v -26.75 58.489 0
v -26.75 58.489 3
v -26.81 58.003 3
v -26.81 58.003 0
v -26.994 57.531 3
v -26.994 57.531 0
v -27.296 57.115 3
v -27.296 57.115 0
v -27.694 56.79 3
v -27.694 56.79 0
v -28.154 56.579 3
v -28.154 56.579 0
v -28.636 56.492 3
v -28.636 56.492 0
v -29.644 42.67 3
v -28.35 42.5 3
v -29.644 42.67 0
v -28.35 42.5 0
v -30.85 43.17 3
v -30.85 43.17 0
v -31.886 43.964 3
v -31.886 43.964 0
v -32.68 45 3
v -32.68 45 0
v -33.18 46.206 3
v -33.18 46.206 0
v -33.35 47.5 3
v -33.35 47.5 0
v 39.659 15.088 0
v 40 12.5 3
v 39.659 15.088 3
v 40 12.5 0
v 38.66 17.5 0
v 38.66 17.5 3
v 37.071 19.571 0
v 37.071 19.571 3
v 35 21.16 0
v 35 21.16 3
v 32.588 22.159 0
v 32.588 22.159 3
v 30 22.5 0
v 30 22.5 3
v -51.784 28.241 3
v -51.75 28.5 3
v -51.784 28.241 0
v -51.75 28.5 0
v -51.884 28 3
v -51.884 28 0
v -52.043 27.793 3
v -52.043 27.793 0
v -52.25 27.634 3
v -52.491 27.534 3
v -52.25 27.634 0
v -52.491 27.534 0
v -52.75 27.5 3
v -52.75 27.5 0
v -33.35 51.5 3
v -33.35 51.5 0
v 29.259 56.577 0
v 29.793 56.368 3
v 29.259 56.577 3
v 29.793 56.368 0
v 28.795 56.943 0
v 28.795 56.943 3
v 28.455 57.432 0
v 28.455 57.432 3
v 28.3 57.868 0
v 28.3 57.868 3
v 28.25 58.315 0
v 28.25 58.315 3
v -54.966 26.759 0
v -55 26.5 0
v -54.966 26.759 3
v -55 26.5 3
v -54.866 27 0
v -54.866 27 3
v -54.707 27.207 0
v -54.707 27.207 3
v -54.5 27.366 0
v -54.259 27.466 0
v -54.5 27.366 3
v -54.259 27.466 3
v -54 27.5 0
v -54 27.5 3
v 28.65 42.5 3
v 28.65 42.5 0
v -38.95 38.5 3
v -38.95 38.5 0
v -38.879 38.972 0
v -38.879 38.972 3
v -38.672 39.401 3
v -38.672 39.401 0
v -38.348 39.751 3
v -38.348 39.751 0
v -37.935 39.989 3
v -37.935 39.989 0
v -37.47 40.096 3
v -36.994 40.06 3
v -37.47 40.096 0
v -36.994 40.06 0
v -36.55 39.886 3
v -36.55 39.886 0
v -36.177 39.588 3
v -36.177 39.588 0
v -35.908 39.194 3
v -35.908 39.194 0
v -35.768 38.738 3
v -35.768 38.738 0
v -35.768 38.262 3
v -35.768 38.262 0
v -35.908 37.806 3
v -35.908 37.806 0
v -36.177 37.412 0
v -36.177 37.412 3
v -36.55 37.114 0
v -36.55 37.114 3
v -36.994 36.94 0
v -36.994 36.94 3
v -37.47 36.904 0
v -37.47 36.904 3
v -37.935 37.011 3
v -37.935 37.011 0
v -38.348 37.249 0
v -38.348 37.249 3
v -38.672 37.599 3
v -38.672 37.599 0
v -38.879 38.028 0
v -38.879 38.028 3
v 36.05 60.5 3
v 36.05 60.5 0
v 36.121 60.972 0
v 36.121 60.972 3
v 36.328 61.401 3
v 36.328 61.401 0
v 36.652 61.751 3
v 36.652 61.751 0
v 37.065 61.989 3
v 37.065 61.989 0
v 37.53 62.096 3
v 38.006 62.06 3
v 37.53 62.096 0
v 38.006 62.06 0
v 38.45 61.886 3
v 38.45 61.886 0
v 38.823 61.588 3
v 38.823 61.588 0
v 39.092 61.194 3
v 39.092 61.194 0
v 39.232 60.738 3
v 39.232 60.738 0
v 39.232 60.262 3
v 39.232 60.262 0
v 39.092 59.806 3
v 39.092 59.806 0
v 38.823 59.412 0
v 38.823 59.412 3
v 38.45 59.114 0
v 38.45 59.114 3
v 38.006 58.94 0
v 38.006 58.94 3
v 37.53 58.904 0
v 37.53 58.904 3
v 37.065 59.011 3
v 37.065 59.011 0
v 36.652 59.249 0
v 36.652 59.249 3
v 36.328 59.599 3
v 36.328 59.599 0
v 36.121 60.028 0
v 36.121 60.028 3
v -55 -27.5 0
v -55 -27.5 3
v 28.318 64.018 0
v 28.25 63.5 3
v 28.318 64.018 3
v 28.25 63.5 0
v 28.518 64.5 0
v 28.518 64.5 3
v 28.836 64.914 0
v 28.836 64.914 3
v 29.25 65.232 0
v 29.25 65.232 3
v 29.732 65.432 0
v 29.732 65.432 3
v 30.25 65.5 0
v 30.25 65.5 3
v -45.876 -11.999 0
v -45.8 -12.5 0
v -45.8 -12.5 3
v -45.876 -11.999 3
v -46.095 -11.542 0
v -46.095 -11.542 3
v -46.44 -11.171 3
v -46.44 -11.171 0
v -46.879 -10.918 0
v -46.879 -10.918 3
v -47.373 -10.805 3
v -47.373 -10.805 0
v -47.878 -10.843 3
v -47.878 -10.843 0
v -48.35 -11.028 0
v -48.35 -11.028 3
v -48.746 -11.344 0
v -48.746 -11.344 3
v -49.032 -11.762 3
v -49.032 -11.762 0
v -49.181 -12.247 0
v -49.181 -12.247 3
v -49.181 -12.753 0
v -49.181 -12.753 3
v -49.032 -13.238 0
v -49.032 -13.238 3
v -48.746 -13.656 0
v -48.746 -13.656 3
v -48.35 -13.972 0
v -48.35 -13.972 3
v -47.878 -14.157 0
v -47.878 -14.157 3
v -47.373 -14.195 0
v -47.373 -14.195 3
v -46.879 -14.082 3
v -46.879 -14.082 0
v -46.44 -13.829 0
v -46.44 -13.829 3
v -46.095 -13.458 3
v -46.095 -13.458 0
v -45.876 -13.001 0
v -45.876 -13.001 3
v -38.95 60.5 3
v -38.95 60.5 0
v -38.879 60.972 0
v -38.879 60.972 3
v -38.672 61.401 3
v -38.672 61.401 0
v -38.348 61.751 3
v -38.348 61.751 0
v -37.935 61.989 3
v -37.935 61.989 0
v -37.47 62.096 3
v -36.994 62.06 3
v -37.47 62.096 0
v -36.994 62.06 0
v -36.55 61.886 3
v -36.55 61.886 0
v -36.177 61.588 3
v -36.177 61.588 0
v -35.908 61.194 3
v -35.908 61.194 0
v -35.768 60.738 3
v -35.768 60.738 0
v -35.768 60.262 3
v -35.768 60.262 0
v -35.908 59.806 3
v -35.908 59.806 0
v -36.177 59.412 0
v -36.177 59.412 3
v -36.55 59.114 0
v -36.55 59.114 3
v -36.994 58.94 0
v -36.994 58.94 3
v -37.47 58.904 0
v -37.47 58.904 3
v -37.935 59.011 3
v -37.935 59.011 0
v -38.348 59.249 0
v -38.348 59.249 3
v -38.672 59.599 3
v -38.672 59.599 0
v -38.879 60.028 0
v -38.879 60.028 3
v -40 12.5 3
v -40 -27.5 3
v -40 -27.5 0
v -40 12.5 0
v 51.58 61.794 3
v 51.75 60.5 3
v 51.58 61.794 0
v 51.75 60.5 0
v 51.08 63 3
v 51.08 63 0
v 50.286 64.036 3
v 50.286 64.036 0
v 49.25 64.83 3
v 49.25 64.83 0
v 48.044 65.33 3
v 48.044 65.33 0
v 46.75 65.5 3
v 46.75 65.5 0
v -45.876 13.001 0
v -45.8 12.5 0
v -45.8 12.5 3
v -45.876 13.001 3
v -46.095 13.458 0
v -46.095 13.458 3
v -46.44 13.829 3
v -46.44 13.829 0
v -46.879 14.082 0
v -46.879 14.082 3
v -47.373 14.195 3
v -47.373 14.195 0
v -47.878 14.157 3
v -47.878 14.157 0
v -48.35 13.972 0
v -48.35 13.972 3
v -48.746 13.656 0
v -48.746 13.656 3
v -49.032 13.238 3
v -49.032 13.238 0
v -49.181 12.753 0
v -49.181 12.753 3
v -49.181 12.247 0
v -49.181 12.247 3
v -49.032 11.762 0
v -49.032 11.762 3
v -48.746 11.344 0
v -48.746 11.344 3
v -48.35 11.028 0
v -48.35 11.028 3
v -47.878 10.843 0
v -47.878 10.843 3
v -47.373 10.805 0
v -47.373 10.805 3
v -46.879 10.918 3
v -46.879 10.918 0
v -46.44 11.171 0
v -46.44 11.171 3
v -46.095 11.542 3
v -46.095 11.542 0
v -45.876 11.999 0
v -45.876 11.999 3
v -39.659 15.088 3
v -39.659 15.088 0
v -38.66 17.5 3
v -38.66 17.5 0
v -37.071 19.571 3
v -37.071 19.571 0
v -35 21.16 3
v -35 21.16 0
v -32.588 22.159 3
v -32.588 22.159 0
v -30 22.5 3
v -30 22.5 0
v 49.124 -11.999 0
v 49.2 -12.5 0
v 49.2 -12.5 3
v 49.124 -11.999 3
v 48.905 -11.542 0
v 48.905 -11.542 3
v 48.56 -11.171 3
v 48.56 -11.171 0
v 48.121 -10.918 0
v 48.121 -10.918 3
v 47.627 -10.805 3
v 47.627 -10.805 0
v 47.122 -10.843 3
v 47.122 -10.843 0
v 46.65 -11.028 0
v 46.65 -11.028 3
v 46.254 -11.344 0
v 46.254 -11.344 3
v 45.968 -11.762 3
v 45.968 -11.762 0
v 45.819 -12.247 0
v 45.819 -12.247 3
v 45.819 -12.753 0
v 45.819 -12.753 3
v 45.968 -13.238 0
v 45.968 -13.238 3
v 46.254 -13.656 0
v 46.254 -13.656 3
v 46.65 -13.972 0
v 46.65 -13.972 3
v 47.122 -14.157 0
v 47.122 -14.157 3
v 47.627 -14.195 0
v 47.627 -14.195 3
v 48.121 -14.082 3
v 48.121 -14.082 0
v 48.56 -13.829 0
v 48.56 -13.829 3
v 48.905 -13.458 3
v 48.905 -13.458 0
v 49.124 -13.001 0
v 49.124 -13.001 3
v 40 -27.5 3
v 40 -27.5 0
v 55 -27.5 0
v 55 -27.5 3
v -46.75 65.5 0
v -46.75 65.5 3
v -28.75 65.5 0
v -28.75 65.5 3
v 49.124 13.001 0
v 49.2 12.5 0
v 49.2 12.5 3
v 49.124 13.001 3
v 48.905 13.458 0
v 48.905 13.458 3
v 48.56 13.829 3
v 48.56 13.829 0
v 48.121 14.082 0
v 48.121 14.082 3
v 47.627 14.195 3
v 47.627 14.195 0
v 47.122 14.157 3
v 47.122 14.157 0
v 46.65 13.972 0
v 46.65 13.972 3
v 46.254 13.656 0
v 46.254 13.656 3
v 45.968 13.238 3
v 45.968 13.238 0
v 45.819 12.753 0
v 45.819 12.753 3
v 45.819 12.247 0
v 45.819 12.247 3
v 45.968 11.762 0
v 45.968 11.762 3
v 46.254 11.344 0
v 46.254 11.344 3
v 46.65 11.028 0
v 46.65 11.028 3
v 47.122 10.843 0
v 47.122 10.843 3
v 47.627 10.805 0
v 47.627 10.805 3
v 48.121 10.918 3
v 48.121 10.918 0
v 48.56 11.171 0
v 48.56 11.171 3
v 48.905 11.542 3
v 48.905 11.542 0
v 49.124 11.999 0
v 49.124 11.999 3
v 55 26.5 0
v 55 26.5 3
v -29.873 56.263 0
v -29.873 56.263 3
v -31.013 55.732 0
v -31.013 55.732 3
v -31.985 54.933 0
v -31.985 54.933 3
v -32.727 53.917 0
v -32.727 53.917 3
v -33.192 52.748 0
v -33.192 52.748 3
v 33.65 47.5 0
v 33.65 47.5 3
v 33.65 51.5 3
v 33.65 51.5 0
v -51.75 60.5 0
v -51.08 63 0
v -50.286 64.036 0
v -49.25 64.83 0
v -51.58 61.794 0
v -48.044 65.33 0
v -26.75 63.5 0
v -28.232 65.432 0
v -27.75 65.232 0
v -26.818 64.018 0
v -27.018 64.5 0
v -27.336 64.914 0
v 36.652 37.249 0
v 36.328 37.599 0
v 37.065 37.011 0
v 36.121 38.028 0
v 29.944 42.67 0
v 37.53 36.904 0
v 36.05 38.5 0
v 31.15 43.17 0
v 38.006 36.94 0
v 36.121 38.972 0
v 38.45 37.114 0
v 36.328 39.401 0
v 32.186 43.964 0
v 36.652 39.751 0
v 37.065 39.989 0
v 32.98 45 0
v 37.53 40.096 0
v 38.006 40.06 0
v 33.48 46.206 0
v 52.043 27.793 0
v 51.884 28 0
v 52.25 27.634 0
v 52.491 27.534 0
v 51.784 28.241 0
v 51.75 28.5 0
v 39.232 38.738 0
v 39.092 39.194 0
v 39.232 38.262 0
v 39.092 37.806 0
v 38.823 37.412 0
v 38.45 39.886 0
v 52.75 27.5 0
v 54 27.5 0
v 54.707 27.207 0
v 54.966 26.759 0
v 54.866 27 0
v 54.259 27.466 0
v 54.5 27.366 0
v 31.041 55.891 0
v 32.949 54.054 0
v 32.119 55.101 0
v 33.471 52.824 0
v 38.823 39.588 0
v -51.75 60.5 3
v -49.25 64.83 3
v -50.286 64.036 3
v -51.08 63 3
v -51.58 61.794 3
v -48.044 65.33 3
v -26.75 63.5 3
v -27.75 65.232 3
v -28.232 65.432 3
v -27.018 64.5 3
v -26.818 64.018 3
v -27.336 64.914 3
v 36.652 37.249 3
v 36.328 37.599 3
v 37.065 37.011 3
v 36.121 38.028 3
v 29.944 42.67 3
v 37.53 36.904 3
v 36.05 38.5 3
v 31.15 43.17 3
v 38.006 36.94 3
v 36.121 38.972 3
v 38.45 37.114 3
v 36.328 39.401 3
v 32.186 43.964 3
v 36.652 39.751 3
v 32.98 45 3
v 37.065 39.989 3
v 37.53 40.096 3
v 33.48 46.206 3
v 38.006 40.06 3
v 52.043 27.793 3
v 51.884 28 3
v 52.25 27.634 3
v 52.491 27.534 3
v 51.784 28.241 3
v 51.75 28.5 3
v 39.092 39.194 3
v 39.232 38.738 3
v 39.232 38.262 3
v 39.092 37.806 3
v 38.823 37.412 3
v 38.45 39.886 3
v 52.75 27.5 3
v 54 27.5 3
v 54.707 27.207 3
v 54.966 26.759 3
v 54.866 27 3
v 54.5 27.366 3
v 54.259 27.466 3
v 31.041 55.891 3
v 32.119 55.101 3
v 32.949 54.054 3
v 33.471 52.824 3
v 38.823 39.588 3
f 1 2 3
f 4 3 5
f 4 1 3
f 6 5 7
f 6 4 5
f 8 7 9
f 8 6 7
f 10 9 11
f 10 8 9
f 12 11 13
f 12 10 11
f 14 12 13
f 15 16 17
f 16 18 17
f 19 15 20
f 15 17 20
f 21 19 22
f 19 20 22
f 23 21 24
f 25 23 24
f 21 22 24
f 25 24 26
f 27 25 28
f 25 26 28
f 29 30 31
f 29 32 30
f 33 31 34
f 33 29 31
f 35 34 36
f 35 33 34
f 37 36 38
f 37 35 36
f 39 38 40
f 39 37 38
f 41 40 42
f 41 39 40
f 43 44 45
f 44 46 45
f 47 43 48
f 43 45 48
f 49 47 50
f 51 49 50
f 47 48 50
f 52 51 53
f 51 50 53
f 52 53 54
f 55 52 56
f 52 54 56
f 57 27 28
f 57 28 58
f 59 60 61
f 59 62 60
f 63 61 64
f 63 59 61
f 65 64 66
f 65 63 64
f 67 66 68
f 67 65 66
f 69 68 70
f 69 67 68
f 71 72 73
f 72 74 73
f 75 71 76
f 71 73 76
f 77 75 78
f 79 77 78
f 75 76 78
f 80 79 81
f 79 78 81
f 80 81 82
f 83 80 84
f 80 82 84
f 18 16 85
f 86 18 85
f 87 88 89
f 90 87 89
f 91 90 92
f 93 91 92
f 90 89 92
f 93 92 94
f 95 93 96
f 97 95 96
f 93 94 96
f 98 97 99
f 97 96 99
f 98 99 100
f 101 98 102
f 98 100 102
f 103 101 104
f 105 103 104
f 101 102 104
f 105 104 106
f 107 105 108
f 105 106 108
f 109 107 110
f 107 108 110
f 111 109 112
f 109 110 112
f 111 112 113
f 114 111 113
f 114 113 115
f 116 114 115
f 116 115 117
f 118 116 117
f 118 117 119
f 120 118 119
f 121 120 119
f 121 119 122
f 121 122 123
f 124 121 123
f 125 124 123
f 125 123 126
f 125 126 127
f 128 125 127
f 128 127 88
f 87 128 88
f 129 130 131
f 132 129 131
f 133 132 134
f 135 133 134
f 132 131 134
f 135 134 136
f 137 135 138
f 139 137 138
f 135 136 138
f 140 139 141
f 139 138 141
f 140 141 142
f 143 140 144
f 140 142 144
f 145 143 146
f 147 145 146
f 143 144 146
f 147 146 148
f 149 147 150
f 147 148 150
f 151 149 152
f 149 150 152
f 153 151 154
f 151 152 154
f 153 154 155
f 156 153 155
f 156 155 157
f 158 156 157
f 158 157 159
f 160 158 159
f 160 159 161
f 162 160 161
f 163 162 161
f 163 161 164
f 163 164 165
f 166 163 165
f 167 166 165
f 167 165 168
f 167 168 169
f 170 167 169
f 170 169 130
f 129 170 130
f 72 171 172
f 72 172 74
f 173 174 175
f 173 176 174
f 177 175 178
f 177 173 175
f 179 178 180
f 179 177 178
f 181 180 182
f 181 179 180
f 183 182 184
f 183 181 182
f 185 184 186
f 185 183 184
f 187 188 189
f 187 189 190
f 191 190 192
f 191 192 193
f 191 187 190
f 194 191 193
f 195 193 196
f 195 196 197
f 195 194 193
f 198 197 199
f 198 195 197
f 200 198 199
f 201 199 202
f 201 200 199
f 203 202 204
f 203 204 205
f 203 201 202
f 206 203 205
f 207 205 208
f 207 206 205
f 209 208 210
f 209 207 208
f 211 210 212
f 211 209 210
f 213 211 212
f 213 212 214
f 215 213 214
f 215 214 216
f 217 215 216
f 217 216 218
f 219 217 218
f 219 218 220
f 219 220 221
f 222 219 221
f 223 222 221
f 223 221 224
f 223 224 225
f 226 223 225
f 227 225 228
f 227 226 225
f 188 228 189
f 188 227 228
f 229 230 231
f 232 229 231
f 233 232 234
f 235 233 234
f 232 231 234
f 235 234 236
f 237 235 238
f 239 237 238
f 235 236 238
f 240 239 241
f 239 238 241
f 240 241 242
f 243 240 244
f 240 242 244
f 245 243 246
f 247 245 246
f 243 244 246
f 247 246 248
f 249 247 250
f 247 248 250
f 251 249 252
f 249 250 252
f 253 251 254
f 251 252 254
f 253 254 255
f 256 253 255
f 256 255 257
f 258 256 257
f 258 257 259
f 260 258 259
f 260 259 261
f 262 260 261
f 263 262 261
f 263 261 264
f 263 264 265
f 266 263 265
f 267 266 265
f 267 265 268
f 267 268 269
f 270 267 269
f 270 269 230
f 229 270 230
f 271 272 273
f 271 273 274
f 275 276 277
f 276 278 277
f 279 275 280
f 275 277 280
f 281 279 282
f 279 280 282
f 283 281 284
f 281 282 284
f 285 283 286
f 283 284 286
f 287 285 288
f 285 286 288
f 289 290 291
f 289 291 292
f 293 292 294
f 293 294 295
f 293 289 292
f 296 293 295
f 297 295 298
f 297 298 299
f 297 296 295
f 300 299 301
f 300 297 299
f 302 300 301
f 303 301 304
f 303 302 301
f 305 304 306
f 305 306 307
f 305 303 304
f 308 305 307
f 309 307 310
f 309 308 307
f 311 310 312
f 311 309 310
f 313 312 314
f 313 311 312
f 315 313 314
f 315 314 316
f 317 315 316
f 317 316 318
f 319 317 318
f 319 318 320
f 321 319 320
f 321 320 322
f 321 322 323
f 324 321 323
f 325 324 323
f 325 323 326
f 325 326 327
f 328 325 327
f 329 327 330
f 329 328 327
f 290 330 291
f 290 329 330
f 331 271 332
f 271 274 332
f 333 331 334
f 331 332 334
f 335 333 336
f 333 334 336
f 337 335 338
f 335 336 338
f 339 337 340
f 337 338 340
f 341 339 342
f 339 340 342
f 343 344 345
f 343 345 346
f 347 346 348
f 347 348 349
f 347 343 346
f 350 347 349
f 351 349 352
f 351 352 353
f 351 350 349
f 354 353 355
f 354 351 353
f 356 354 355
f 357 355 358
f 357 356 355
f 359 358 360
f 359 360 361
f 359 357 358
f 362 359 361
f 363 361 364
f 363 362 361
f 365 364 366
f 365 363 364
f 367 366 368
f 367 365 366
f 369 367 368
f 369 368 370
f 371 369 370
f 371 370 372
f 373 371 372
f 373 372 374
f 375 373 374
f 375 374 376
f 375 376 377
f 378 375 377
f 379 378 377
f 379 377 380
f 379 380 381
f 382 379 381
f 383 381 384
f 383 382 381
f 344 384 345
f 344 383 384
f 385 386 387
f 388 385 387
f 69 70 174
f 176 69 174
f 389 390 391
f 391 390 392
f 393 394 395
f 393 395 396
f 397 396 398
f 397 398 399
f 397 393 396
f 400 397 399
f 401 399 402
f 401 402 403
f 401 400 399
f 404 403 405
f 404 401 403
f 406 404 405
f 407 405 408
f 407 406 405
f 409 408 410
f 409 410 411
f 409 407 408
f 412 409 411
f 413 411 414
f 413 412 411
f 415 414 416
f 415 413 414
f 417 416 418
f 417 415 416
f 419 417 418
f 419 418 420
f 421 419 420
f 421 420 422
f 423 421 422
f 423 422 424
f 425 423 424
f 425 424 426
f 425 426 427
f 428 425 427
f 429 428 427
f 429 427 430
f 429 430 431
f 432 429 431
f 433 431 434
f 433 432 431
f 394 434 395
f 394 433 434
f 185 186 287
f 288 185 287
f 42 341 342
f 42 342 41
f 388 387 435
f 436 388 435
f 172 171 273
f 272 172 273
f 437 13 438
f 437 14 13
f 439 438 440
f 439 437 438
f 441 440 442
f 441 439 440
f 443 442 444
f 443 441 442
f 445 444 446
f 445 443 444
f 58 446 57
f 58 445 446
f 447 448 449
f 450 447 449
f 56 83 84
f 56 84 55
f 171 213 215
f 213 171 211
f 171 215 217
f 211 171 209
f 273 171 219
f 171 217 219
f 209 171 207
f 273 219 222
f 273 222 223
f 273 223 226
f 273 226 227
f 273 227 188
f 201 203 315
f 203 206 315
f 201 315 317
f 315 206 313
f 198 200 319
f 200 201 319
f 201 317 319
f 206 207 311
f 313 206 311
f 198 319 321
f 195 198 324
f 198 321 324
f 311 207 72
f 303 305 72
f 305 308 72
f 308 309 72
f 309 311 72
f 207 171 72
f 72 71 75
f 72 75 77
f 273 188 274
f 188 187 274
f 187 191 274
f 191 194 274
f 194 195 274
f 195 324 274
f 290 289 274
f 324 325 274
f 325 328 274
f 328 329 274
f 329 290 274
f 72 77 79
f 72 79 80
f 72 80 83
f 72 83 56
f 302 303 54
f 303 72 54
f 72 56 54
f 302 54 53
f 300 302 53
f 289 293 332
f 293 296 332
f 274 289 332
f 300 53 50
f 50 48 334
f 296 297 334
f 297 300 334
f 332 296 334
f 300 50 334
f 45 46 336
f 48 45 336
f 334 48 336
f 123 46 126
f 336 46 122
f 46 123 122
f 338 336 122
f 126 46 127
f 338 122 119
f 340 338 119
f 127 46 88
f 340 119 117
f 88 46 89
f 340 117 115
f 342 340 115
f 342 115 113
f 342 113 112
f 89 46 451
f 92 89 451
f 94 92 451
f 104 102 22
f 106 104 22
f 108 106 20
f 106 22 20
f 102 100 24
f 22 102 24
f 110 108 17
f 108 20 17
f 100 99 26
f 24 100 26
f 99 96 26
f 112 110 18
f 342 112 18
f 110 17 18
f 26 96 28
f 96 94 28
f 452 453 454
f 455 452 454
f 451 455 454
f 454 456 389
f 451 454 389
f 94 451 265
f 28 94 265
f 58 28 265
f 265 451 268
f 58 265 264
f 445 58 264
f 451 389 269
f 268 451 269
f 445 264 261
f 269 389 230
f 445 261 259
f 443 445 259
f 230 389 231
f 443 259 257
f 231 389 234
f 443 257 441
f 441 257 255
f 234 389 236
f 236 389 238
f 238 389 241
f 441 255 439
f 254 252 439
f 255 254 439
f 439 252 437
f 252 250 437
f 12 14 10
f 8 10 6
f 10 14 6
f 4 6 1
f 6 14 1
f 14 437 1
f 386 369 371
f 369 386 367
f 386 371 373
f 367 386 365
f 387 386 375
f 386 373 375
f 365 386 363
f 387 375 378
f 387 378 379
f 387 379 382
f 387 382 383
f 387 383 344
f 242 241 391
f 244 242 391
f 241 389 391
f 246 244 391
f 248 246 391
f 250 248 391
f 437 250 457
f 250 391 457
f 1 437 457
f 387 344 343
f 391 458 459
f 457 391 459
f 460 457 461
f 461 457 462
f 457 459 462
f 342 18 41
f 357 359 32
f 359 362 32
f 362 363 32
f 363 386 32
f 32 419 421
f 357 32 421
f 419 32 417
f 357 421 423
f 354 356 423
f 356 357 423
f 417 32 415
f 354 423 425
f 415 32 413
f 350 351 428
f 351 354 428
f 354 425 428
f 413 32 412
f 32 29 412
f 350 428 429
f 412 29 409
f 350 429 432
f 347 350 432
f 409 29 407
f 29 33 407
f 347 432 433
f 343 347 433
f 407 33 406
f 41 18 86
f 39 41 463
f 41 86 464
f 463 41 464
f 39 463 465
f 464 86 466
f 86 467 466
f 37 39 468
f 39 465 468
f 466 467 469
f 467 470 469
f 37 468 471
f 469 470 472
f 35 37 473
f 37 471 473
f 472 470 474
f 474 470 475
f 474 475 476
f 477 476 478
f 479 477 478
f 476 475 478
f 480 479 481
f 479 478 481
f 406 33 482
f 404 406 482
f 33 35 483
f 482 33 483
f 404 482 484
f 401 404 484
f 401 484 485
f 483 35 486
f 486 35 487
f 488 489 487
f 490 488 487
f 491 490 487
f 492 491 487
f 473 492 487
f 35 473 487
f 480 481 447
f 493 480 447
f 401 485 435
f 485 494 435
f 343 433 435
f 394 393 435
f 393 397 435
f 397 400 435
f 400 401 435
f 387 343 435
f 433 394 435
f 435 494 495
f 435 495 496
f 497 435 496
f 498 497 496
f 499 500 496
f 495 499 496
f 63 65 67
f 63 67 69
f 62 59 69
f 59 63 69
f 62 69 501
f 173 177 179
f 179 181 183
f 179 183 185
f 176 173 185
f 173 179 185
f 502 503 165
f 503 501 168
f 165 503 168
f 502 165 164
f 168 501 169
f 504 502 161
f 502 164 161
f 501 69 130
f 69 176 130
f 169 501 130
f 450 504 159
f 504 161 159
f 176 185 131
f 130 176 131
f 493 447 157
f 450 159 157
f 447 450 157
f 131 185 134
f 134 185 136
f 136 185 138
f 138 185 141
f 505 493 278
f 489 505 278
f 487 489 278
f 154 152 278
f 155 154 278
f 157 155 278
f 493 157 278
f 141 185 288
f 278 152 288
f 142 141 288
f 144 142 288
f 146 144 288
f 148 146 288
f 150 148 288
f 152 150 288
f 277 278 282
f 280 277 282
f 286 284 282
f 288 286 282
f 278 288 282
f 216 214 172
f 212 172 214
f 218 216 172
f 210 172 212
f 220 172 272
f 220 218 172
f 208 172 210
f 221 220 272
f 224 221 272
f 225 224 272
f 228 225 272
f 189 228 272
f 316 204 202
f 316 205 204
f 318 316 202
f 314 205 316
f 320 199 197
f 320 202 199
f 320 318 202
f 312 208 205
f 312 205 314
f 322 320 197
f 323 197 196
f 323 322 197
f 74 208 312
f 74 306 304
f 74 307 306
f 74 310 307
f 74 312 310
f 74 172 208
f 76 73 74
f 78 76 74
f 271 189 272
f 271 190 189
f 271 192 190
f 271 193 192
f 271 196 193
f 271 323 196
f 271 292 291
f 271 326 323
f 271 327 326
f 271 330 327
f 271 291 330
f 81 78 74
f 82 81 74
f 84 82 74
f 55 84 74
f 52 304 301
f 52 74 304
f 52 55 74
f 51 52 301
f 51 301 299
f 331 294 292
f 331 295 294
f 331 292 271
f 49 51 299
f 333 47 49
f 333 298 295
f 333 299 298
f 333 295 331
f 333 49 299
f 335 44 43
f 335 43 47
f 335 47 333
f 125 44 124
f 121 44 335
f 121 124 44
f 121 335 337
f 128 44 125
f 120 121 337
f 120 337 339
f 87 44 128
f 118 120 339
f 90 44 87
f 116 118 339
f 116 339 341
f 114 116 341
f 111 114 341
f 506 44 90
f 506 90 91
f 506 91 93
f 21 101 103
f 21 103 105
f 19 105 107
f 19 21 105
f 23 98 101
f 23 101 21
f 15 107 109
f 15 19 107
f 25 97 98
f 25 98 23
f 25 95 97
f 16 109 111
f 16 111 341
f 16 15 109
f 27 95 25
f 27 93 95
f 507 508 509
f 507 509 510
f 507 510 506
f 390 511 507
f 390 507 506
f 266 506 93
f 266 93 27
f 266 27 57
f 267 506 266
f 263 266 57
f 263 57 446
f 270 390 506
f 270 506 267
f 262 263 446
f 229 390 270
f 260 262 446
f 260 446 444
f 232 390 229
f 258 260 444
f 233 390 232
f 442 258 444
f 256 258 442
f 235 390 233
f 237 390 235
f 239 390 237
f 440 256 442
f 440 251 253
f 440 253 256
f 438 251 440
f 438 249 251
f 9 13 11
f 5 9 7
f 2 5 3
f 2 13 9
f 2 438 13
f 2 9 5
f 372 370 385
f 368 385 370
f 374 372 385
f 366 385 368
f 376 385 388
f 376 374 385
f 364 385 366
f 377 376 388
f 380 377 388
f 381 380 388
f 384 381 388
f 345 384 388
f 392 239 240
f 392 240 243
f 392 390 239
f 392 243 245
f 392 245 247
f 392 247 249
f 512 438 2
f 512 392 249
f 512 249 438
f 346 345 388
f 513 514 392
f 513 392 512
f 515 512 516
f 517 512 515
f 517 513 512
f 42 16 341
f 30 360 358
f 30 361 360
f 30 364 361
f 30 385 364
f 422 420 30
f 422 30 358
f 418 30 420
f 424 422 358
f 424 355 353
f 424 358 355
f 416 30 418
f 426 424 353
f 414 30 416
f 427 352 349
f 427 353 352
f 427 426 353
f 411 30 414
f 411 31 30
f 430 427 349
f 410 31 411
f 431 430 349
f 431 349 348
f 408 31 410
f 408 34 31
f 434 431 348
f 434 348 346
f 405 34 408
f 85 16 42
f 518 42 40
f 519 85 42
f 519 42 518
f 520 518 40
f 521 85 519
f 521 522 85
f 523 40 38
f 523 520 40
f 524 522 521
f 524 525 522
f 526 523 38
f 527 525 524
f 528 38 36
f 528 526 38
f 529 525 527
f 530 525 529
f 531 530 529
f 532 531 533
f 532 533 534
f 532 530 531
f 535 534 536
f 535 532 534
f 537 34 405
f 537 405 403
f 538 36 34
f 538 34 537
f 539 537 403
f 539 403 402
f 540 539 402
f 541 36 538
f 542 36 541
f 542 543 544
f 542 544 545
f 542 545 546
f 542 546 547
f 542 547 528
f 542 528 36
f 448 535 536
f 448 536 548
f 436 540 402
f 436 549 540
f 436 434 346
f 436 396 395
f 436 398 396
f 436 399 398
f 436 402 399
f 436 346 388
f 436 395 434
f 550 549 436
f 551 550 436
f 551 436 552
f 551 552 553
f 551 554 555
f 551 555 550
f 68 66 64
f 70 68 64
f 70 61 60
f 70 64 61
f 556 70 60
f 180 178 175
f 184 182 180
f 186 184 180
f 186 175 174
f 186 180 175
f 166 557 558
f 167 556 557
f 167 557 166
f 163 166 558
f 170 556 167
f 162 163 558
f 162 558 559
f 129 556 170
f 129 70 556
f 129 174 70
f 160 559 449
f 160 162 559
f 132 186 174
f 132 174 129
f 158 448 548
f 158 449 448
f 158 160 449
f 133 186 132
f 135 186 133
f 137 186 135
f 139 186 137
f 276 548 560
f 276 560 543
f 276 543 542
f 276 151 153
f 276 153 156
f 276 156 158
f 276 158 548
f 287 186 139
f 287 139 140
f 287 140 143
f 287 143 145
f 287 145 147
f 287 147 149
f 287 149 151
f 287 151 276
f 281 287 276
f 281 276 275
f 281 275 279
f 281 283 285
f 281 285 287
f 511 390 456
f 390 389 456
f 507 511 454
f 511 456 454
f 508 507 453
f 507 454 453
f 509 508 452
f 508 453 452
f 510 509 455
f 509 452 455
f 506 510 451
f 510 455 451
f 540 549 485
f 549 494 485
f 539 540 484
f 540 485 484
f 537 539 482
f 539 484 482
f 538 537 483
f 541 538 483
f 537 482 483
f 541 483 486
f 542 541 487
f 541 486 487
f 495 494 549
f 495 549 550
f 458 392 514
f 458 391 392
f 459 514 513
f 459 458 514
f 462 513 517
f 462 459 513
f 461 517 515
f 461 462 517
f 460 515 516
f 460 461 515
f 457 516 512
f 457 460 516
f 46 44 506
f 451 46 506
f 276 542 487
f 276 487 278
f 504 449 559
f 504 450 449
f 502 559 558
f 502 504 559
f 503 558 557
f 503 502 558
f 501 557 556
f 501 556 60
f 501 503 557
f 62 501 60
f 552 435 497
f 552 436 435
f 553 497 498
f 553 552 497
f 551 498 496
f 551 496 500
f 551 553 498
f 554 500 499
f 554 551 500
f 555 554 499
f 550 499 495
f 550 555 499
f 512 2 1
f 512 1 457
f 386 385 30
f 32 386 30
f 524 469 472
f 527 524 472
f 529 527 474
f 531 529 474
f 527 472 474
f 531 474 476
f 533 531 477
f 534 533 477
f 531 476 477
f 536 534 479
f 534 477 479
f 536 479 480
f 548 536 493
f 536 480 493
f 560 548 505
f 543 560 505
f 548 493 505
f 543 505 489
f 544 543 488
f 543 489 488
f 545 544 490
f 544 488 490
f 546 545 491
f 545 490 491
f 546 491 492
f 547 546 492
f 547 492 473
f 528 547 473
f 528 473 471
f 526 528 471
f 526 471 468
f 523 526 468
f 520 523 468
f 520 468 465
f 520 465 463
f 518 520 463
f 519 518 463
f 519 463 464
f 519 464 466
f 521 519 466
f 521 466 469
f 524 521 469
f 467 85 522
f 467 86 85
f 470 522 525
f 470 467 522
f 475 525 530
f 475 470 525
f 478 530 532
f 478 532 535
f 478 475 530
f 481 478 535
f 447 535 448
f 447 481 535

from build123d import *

# Parameters (mm, degrees)
SKETCH_1_W          = 110
SKETCH_1_H          = 55
SKETCH_1_R          = 1.7
EXTRUDE_1_DEPTH     = 3
SKETCH_2_W          = 103.5
SKETCH_2_H          = 38
EXTRUDE_2_DEPTH     = 3
SKETCH_3_R          = 1.6
CUT_EXTRUDE_1_DEPTH = 4
SKETCH_4_W          = 80
SKETCH_4_H          = 50
SKETCH_4_W_2        = 66.999999997
SKETCH_4_H_2        = 13.999999819
CUT_EXTRUDE_2_DEPTH = 4
FILLET_2_R          = 10
FILLET_3_R          = 1
FILLET_5_R          = 5
SKETCH_10_R         = 1.65
CUT_EXTRUDE_5_DEPTH = 4
SKETCH_11_W         = 55
SKETCH_11_H         = 9
CUT_EXTRUDE_6_DEPTH = 4
FILLET_6_R          = 2


with BuildPart() as part:
    # 草图1 → 凸台-拉伸1 (new body)
    with BuildSketch(Plane.XY):
        Rectangle(SKETCH_1_W, SKETCH_1_H)
        with Locations((-47.5, 12.5)):
            Circle(SKETCH_1_R, mode=Mode.SUBTRACT)
        with Locations((-47.5, -12.5)):
            Circle(SKETCH_1_R, mode=Mode.SUBTRACT)
        with Locations((47.5, 12.5)):
            Circle(SKETCH_1_R, mode=Mode.SUBTRACT)
        with Locations((47.5, -12.5)):
            Circle(SKETCH_1_R, mode=Mode.SUBTRACT)
    extrude(amount=EXTRUDE_1_DEPTH)

    # 草图2 → 凸台-拉伸2 (add)
    with BuildSketch(Plane.XY.offset(3)):
        with Locations((0, 46.5)):
            Rectangle(SKETCH_2_W, SKETCH_2_H)
    extrude(amount=-EXTRUDE_2_DEPTH)

    # 草图3 → 切除-拉伸1 (cut, through all)
    with BuildSketch(Plane(origin=(0, 0, 0), x_dir=(-1, 0, 0), z_dir=(0, 0, -1))):
        with Locations((37.35, 60.5)):
            Circle(SKETCH_3_R)
        with Locations((-37.649999997, 60.5)):
            Circle(SKETCH_3_R)
        with Locations((-37.649999997, 38.500000181)):
            Circle(SKETCH_3_R)
        with Locations((37.35, 38.500000181)):
            Circle(SKETCH_3_R)
    extrude(amount=-CUT_EXTRUDE_1_DEPTH, mode=Mode.SUBTRACT)

    # 草图4 → 切除-拉伸2 (cut, through all)
    with BuildSketch(Plane.XY.offset(3)):
        with Locations((0, -2.5)):
            Rectangle(SKETCH_4_W, SKETCH_4_H)
        with Locations((0.149999999, 49.500000091)):
            Rectangle(SKETCH_4_W_2, SKETCH_4_H_2)
    extrude(amount=-CUT_EXTRUDE_2_DEPTH, mode=Mode.SUBTRACT)

    # 圆角2
    fillet_2_edges = [part.edges().sort_by_distance(p)[0] for p in [
        (-40, 22.5, 1.5),
        (40, 22.5, 1.5),
    ]]
    fillet(fillet_2_edges, radius=FILLET_2_R)

    # 圆角3
    fillet_3_edges = [part.edges().sort_by_distance(p)[0] for p in [
        (51.75, 27.5, 1.5),
        (-51.75, 27.5, 1.5),
        (-55, 27.5, 1.5),
        (55, 27.5, 1.5),
    ]]
    fillet(fillet_3_edges, radius=FILLET_3_R)

    # 圆角5
    fillet_5_edges = [part.edges().sort_by_distance(p)[0] for p in [
        (-51.75, 65.5, 1.5),
        (51.75, 65.5, 1.5),
        (-33.35, 56.5, 1.5),
        (33.649999997, 56.5, 1.5),
        (33.649999997, 42.500000181, 1.5),
        (-33.35, 42.500000181, 1.5),
    ]]
    fillet(fillet_5_edges, radius=FILLET_5_R)

    # 草图10 → 切除-拉伸5 (cut, through all)
    with BuildSketch(Plane.XY.offset(3)):
        with Locations((-22.85, 60.5)):
            Circle(SKETCH_10_R)
        with Locations((5.15, 60.5)):
            Circle(SKETCH_10_R)
    extrude(amount=-CUT_EXTRUDE_5_DEPTH, mode=Mode.SUBTRACT)

    # 草图11 → 切除-拉伸6 (cut, through all)
    with BuildSketch(Plane.XY.offset(3)):
        with Locations((0.75, 61)):
            Rectangle(SKETCH_11_W, SKETCH_11_H)
    extrude(amount=-CUT_EXTRUDE_6_DEPTH, mode=Mode.SUBTRACT)

    # 圆角6
    fillet_6_edges = [part.edges().sort_by_distance(p)[0] for p in [
        (28.25, 56.5, 1.5),
        (28.25, 65.5, 1.5),
        (-26.75, 56.5, 1.5),
        (-26.75, 65.5, 1.5),
    ]]
    fillet(fillet_6_edges, radius=FILLET_6_R)


solid = part.part
